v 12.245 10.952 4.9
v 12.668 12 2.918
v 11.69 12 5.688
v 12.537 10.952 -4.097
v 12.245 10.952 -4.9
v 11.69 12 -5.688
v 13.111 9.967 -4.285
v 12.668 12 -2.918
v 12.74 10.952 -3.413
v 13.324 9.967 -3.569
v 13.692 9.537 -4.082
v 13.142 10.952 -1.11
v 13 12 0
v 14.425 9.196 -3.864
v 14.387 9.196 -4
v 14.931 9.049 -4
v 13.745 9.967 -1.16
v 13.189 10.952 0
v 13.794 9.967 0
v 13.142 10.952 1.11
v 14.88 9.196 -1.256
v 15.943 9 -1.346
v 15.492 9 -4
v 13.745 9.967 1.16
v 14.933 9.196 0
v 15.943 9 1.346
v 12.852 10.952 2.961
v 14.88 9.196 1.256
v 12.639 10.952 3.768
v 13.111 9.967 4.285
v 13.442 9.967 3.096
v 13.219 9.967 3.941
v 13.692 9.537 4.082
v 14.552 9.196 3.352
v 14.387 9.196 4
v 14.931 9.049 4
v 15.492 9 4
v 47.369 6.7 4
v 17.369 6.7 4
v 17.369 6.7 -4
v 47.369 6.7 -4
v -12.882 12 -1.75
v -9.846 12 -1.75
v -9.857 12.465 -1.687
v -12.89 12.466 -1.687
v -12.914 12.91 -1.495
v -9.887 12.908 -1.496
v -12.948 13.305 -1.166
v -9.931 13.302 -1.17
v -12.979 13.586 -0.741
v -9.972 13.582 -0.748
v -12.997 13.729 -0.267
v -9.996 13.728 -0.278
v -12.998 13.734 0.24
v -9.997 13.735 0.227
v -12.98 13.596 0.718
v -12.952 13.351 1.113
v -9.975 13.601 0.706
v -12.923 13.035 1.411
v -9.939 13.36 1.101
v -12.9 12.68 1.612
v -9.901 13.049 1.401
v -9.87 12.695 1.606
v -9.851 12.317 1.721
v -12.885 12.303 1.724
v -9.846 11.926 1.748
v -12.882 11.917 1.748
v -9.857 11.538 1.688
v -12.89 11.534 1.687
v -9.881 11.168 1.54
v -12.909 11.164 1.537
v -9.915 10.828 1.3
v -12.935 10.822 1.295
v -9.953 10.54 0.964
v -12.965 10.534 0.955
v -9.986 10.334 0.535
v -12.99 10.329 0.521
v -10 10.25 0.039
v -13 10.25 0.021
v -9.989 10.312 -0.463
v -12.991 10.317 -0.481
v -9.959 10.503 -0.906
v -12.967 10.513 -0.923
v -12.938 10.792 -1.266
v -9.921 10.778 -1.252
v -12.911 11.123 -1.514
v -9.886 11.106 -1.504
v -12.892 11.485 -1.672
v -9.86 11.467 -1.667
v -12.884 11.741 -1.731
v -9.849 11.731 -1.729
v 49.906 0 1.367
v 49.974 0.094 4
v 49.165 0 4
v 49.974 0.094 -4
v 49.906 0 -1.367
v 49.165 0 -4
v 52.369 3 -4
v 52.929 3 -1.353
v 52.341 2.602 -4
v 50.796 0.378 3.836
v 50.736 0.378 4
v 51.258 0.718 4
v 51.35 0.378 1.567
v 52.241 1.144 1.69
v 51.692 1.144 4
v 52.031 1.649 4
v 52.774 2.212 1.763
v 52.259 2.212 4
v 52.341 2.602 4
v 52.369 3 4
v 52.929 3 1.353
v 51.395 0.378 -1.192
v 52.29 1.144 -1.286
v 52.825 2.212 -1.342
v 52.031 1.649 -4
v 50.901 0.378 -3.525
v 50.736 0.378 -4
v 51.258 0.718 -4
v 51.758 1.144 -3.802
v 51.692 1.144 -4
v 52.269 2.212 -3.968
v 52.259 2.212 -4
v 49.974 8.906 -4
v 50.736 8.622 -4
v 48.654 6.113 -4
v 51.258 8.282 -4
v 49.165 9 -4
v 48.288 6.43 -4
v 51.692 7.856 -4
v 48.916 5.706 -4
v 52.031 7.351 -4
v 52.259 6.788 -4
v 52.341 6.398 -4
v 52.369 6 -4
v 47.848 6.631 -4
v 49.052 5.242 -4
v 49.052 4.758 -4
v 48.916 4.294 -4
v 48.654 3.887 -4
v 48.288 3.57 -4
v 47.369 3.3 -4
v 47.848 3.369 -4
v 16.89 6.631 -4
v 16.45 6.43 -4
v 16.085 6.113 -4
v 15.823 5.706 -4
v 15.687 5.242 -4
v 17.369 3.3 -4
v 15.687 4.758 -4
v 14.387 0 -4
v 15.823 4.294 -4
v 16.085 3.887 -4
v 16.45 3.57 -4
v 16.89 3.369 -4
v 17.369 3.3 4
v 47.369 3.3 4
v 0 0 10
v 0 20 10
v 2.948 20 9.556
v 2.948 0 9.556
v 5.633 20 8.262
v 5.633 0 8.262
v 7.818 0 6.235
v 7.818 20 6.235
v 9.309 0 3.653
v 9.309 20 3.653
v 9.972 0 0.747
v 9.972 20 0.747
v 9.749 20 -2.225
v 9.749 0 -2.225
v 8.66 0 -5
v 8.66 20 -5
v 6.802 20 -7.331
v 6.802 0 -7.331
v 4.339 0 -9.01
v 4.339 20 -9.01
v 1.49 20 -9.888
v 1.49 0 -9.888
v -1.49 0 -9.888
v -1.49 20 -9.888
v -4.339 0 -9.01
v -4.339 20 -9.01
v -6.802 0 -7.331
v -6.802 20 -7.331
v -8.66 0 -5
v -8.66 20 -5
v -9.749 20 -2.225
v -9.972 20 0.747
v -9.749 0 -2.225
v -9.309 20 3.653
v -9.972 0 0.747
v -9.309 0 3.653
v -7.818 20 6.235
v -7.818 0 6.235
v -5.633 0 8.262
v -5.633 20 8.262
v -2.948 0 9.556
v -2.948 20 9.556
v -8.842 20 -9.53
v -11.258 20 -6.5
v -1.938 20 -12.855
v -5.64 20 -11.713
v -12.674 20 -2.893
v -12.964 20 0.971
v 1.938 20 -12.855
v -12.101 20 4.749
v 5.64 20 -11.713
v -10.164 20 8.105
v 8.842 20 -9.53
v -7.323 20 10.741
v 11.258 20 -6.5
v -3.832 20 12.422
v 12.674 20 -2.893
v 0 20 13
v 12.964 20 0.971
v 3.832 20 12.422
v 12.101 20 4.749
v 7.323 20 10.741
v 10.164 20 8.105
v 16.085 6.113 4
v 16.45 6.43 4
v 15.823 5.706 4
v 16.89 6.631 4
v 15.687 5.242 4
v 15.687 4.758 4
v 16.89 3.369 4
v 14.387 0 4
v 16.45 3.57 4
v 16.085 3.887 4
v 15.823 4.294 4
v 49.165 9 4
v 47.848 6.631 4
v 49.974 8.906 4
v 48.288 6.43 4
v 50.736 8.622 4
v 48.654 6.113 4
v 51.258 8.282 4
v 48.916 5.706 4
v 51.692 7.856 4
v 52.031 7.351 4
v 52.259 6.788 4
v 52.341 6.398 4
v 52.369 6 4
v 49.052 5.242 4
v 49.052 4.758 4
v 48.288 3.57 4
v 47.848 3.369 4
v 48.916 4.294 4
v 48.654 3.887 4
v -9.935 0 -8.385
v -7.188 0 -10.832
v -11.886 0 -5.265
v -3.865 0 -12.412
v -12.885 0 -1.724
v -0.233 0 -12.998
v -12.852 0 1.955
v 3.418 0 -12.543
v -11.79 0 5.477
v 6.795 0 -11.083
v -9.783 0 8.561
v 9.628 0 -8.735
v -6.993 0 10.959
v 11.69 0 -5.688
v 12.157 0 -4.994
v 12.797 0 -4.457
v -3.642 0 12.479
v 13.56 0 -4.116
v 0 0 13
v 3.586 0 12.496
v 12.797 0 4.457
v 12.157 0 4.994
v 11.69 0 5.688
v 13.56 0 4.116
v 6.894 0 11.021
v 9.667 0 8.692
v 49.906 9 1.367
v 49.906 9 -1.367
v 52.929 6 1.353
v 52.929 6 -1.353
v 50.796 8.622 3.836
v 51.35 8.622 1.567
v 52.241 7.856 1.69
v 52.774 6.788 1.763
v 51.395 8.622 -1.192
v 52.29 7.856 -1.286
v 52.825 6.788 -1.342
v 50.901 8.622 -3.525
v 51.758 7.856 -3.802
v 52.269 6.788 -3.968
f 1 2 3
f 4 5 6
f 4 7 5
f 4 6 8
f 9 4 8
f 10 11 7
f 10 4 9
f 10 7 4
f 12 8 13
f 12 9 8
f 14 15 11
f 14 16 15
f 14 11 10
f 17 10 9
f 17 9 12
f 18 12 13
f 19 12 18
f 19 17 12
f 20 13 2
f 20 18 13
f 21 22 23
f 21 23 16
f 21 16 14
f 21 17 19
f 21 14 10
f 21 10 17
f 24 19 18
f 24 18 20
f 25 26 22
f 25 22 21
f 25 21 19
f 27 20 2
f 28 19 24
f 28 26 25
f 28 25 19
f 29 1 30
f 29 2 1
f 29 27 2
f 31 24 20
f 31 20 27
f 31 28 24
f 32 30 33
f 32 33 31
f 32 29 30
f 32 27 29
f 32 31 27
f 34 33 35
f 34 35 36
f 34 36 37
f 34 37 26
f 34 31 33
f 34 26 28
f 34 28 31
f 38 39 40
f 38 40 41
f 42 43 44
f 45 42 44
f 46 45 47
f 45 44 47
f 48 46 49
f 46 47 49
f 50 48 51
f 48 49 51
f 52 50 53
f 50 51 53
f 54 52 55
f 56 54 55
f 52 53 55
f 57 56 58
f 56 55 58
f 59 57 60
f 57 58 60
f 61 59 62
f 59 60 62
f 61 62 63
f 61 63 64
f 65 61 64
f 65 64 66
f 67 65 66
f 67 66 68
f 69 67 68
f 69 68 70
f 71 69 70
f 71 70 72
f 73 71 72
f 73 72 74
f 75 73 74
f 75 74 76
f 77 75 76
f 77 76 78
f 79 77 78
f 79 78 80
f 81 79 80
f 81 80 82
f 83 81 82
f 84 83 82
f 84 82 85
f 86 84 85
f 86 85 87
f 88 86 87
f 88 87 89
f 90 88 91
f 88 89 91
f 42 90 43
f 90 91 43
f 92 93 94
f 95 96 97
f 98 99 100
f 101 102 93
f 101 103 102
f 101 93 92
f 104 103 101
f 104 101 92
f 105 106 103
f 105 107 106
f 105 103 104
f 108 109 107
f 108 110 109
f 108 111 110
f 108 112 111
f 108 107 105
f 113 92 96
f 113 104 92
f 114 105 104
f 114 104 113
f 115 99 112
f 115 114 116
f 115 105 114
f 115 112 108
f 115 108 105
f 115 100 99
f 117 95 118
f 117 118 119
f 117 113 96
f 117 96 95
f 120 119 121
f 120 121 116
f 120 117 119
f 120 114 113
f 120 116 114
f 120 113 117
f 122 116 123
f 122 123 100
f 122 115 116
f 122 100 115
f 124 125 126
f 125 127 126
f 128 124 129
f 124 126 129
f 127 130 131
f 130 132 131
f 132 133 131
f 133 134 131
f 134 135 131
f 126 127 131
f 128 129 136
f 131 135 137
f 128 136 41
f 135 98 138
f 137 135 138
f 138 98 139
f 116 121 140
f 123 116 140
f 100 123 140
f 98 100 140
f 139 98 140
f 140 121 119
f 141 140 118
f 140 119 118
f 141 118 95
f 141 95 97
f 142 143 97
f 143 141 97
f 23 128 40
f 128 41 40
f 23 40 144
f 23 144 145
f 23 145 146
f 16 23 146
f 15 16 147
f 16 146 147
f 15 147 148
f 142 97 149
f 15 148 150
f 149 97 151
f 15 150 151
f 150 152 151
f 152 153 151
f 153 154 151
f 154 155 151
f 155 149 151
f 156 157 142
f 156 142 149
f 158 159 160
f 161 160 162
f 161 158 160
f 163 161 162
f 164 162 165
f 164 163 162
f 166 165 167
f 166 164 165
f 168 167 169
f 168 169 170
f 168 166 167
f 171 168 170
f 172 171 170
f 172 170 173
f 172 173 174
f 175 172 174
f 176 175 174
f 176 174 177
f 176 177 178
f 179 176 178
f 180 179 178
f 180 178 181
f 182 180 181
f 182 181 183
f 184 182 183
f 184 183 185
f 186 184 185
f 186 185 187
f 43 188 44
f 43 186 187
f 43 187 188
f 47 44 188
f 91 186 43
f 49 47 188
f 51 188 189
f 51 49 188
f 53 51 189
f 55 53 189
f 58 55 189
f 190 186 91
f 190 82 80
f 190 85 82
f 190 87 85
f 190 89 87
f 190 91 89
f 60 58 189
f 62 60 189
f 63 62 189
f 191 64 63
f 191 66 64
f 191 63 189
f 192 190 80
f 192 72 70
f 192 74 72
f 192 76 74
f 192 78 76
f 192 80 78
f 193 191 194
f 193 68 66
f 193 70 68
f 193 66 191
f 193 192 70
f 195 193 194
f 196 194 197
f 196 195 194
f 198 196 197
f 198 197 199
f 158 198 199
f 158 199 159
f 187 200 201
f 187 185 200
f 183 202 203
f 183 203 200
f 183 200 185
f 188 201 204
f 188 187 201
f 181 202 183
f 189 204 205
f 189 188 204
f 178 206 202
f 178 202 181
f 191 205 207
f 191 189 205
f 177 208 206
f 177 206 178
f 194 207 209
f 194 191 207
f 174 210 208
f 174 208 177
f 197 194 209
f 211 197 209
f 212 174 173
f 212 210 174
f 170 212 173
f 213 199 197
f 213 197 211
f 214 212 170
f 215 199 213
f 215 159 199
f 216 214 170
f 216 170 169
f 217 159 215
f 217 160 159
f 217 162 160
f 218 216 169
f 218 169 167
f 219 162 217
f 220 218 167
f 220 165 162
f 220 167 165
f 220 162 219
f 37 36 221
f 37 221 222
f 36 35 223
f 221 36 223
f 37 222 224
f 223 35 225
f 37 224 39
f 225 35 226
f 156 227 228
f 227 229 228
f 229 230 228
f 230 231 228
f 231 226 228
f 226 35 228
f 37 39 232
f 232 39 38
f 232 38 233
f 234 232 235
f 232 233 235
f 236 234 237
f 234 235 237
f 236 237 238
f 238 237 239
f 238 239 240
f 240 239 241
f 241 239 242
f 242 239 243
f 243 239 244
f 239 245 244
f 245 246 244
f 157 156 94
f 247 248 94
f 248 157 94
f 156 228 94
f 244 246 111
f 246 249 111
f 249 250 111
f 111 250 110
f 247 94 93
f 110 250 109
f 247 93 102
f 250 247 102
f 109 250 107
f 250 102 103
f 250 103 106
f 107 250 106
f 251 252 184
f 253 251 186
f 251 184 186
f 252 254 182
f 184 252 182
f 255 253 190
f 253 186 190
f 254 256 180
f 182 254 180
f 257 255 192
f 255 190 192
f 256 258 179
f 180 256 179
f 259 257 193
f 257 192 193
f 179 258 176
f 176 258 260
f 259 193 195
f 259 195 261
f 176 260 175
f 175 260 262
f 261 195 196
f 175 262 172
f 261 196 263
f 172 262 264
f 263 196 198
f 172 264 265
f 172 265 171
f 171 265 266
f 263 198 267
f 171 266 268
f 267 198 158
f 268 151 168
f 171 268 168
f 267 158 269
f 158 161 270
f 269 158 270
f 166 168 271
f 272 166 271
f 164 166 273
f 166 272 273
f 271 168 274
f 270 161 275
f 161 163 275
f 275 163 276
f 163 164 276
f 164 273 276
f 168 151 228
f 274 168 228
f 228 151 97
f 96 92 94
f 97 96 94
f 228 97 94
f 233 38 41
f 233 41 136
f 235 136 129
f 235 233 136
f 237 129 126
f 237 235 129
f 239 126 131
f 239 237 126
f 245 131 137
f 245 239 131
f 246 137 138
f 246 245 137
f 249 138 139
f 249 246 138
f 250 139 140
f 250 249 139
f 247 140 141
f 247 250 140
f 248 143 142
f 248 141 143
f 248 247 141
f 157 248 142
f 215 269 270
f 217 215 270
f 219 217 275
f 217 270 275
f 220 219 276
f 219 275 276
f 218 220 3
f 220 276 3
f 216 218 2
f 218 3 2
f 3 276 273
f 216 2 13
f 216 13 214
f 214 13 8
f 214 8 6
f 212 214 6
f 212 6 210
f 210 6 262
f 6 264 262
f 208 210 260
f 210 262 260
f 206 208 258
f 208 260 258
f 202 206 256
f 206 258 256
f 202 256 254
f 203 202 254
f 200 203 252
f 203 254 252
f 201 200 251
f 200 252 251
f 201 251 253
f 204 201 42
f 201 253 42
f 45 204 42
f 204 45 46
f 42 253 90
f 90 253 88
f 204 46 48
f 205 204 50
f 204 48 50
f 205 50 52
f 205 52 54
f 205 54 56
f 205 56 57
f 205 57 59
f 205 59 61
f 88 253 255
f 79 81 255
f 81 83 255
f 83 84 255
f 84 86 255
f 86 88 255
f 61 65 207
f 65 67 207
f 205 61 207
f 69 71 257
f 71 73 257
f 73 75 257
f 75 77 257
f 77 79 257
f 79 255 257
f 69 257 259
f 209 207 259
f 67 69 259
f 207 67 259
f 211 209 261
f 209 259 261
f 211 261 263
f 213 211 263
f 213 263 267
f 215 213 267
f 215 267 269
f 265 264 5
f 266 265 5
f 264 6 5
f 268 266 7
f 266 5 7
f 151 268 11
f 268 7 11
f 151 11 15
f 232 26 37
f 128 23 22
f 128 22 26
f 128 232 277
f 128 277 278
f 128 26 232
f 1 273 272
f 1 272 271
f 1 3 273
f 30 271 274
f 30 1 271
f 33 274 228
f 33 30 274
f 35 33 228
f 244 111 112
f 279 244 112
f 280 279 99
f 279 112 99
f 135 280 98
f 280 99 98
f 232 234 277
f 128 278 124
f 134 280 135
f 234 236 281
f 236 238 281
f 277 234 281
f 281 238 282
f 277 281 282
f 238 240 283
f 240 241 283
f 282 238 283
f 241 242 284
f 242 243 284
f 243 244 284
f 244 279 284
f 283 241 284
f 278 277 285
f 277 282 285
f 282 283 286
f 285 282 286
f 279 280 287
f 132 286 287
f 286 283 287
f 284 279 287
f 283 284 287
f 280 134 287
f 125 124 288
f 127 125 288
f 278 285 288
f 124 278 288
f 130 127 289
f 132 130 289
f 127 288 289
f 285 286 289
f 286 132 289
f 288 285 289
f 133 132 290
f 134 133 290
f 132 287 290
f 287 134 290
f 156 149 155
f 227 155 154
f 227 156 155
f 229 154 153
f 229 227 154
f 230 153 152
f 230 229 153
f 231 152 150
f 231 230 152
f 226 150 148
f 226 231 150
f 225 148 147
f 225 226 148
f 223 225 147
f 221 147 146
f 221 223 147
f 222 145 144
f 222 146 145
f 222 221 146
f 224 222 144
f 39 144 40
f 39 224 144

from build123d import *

# Parameters (mm, degrees)
SKETCH_1_R          = 13
SKETCH_1_R_2        = 10
EXTRUDE_1_DEPTH     = 20
EXTRUDE_2_DEPTH     = 9
CUT_EXTRUDE_1_DEPTH = 60.14389233
FILLET_1_R          = 3
SKETCH_4_R          = 1.75
CUT_EXTRUDE_2_DEPTH = 59.120564438


# Read off the part's stored shape, not the designer's step: 凸台-拉伸2
with BuildPart() as part:
    # 草图1 → 凸台-拉伸1 (new body)
    with BuildSketch(Plane(origin=(0, 0, 0), x_dir=(1, 0, 0), z_dir=(0, 1, 0))):
        with Locations(Location((0, 0, 0), (0, 0, 270))):
            Circle(SKETCH_1_R)
        with Locations(Location((0, 0, 0), (0, 0, 270))):
            Circle(SKETCH_1_R_2, mode=Mode.SUBTRACT)
    extrude(amount=EXTRUDE_1_DEPTH)

    # 凸台-拉伸2 outline → 凸台-拉伸2 (add)
    with BuildSketch(Plane(origin=(0, 0, 0), x_dir=(1, 0, 0), z_dir=(0, 1, 0))):
        with BuildLine():
            ThreePointArc((52.369316877, -4), (53, 0), (52.369316877, 4))
            Line((52.369316877, 4), (12.369316877, 4))
            ThreePointArc((12.369316877, 4), (13, 0), (12.369316877, -4))
            Line((12.369316877, -4), (52.369316877, -4))
        make_face()
    extrude(amount=EXTRUDE_2_DEPTH)

    # 草图3 → 切除-拉伸1 (cut, through all)
    with BuildSketch(Plane.XY.offset(4)):
        with BuildLine():
            Line((17.369316877, 6.7), (47.369316877, 6.7))
            ThreePointArc((47.369316877, 6.7), (49.069316877, 5), (47.369316877, 3.3))
            Line((47.369316877, 3.3), (17.369316877, 3.3))
            ThreePointArc((17.369316877, 3.3), (15.669316877, 5), (17.369316877, 6.7))
        make_face()
    extrude(amount=-CUT_EXTRUDE_1_DEPTH, mode=Mode.SUBTRACT)

    # 圆角1
    fillet_1_edges = [part.edges().sort_by_distance(p)[0] for p in [
        (53, 9, 0),
        (53, 0, 0),
        (12.369316877, 4.5, -4),
        (13, 9, 0),
        (12.369316877, 4.5, 4),
    ]]
    fillet(fillet_1_edges, radius=FILLET_1_R)

    # 草图4 → 切除-拉伸2 (cut, through all)
    with BuildSketch(Plane(origin=(0, 0, 0), x_dir=(0, 0, -1), z_dir=(1, 0, 0))):
        with Locations((0, 12)):
            Circle(SKETCH_4_R)
    extrude(amount=-CUT_EXTRUDE_2_DEPTH, mode=Mode.SUBTRACT)


solid = part.part
